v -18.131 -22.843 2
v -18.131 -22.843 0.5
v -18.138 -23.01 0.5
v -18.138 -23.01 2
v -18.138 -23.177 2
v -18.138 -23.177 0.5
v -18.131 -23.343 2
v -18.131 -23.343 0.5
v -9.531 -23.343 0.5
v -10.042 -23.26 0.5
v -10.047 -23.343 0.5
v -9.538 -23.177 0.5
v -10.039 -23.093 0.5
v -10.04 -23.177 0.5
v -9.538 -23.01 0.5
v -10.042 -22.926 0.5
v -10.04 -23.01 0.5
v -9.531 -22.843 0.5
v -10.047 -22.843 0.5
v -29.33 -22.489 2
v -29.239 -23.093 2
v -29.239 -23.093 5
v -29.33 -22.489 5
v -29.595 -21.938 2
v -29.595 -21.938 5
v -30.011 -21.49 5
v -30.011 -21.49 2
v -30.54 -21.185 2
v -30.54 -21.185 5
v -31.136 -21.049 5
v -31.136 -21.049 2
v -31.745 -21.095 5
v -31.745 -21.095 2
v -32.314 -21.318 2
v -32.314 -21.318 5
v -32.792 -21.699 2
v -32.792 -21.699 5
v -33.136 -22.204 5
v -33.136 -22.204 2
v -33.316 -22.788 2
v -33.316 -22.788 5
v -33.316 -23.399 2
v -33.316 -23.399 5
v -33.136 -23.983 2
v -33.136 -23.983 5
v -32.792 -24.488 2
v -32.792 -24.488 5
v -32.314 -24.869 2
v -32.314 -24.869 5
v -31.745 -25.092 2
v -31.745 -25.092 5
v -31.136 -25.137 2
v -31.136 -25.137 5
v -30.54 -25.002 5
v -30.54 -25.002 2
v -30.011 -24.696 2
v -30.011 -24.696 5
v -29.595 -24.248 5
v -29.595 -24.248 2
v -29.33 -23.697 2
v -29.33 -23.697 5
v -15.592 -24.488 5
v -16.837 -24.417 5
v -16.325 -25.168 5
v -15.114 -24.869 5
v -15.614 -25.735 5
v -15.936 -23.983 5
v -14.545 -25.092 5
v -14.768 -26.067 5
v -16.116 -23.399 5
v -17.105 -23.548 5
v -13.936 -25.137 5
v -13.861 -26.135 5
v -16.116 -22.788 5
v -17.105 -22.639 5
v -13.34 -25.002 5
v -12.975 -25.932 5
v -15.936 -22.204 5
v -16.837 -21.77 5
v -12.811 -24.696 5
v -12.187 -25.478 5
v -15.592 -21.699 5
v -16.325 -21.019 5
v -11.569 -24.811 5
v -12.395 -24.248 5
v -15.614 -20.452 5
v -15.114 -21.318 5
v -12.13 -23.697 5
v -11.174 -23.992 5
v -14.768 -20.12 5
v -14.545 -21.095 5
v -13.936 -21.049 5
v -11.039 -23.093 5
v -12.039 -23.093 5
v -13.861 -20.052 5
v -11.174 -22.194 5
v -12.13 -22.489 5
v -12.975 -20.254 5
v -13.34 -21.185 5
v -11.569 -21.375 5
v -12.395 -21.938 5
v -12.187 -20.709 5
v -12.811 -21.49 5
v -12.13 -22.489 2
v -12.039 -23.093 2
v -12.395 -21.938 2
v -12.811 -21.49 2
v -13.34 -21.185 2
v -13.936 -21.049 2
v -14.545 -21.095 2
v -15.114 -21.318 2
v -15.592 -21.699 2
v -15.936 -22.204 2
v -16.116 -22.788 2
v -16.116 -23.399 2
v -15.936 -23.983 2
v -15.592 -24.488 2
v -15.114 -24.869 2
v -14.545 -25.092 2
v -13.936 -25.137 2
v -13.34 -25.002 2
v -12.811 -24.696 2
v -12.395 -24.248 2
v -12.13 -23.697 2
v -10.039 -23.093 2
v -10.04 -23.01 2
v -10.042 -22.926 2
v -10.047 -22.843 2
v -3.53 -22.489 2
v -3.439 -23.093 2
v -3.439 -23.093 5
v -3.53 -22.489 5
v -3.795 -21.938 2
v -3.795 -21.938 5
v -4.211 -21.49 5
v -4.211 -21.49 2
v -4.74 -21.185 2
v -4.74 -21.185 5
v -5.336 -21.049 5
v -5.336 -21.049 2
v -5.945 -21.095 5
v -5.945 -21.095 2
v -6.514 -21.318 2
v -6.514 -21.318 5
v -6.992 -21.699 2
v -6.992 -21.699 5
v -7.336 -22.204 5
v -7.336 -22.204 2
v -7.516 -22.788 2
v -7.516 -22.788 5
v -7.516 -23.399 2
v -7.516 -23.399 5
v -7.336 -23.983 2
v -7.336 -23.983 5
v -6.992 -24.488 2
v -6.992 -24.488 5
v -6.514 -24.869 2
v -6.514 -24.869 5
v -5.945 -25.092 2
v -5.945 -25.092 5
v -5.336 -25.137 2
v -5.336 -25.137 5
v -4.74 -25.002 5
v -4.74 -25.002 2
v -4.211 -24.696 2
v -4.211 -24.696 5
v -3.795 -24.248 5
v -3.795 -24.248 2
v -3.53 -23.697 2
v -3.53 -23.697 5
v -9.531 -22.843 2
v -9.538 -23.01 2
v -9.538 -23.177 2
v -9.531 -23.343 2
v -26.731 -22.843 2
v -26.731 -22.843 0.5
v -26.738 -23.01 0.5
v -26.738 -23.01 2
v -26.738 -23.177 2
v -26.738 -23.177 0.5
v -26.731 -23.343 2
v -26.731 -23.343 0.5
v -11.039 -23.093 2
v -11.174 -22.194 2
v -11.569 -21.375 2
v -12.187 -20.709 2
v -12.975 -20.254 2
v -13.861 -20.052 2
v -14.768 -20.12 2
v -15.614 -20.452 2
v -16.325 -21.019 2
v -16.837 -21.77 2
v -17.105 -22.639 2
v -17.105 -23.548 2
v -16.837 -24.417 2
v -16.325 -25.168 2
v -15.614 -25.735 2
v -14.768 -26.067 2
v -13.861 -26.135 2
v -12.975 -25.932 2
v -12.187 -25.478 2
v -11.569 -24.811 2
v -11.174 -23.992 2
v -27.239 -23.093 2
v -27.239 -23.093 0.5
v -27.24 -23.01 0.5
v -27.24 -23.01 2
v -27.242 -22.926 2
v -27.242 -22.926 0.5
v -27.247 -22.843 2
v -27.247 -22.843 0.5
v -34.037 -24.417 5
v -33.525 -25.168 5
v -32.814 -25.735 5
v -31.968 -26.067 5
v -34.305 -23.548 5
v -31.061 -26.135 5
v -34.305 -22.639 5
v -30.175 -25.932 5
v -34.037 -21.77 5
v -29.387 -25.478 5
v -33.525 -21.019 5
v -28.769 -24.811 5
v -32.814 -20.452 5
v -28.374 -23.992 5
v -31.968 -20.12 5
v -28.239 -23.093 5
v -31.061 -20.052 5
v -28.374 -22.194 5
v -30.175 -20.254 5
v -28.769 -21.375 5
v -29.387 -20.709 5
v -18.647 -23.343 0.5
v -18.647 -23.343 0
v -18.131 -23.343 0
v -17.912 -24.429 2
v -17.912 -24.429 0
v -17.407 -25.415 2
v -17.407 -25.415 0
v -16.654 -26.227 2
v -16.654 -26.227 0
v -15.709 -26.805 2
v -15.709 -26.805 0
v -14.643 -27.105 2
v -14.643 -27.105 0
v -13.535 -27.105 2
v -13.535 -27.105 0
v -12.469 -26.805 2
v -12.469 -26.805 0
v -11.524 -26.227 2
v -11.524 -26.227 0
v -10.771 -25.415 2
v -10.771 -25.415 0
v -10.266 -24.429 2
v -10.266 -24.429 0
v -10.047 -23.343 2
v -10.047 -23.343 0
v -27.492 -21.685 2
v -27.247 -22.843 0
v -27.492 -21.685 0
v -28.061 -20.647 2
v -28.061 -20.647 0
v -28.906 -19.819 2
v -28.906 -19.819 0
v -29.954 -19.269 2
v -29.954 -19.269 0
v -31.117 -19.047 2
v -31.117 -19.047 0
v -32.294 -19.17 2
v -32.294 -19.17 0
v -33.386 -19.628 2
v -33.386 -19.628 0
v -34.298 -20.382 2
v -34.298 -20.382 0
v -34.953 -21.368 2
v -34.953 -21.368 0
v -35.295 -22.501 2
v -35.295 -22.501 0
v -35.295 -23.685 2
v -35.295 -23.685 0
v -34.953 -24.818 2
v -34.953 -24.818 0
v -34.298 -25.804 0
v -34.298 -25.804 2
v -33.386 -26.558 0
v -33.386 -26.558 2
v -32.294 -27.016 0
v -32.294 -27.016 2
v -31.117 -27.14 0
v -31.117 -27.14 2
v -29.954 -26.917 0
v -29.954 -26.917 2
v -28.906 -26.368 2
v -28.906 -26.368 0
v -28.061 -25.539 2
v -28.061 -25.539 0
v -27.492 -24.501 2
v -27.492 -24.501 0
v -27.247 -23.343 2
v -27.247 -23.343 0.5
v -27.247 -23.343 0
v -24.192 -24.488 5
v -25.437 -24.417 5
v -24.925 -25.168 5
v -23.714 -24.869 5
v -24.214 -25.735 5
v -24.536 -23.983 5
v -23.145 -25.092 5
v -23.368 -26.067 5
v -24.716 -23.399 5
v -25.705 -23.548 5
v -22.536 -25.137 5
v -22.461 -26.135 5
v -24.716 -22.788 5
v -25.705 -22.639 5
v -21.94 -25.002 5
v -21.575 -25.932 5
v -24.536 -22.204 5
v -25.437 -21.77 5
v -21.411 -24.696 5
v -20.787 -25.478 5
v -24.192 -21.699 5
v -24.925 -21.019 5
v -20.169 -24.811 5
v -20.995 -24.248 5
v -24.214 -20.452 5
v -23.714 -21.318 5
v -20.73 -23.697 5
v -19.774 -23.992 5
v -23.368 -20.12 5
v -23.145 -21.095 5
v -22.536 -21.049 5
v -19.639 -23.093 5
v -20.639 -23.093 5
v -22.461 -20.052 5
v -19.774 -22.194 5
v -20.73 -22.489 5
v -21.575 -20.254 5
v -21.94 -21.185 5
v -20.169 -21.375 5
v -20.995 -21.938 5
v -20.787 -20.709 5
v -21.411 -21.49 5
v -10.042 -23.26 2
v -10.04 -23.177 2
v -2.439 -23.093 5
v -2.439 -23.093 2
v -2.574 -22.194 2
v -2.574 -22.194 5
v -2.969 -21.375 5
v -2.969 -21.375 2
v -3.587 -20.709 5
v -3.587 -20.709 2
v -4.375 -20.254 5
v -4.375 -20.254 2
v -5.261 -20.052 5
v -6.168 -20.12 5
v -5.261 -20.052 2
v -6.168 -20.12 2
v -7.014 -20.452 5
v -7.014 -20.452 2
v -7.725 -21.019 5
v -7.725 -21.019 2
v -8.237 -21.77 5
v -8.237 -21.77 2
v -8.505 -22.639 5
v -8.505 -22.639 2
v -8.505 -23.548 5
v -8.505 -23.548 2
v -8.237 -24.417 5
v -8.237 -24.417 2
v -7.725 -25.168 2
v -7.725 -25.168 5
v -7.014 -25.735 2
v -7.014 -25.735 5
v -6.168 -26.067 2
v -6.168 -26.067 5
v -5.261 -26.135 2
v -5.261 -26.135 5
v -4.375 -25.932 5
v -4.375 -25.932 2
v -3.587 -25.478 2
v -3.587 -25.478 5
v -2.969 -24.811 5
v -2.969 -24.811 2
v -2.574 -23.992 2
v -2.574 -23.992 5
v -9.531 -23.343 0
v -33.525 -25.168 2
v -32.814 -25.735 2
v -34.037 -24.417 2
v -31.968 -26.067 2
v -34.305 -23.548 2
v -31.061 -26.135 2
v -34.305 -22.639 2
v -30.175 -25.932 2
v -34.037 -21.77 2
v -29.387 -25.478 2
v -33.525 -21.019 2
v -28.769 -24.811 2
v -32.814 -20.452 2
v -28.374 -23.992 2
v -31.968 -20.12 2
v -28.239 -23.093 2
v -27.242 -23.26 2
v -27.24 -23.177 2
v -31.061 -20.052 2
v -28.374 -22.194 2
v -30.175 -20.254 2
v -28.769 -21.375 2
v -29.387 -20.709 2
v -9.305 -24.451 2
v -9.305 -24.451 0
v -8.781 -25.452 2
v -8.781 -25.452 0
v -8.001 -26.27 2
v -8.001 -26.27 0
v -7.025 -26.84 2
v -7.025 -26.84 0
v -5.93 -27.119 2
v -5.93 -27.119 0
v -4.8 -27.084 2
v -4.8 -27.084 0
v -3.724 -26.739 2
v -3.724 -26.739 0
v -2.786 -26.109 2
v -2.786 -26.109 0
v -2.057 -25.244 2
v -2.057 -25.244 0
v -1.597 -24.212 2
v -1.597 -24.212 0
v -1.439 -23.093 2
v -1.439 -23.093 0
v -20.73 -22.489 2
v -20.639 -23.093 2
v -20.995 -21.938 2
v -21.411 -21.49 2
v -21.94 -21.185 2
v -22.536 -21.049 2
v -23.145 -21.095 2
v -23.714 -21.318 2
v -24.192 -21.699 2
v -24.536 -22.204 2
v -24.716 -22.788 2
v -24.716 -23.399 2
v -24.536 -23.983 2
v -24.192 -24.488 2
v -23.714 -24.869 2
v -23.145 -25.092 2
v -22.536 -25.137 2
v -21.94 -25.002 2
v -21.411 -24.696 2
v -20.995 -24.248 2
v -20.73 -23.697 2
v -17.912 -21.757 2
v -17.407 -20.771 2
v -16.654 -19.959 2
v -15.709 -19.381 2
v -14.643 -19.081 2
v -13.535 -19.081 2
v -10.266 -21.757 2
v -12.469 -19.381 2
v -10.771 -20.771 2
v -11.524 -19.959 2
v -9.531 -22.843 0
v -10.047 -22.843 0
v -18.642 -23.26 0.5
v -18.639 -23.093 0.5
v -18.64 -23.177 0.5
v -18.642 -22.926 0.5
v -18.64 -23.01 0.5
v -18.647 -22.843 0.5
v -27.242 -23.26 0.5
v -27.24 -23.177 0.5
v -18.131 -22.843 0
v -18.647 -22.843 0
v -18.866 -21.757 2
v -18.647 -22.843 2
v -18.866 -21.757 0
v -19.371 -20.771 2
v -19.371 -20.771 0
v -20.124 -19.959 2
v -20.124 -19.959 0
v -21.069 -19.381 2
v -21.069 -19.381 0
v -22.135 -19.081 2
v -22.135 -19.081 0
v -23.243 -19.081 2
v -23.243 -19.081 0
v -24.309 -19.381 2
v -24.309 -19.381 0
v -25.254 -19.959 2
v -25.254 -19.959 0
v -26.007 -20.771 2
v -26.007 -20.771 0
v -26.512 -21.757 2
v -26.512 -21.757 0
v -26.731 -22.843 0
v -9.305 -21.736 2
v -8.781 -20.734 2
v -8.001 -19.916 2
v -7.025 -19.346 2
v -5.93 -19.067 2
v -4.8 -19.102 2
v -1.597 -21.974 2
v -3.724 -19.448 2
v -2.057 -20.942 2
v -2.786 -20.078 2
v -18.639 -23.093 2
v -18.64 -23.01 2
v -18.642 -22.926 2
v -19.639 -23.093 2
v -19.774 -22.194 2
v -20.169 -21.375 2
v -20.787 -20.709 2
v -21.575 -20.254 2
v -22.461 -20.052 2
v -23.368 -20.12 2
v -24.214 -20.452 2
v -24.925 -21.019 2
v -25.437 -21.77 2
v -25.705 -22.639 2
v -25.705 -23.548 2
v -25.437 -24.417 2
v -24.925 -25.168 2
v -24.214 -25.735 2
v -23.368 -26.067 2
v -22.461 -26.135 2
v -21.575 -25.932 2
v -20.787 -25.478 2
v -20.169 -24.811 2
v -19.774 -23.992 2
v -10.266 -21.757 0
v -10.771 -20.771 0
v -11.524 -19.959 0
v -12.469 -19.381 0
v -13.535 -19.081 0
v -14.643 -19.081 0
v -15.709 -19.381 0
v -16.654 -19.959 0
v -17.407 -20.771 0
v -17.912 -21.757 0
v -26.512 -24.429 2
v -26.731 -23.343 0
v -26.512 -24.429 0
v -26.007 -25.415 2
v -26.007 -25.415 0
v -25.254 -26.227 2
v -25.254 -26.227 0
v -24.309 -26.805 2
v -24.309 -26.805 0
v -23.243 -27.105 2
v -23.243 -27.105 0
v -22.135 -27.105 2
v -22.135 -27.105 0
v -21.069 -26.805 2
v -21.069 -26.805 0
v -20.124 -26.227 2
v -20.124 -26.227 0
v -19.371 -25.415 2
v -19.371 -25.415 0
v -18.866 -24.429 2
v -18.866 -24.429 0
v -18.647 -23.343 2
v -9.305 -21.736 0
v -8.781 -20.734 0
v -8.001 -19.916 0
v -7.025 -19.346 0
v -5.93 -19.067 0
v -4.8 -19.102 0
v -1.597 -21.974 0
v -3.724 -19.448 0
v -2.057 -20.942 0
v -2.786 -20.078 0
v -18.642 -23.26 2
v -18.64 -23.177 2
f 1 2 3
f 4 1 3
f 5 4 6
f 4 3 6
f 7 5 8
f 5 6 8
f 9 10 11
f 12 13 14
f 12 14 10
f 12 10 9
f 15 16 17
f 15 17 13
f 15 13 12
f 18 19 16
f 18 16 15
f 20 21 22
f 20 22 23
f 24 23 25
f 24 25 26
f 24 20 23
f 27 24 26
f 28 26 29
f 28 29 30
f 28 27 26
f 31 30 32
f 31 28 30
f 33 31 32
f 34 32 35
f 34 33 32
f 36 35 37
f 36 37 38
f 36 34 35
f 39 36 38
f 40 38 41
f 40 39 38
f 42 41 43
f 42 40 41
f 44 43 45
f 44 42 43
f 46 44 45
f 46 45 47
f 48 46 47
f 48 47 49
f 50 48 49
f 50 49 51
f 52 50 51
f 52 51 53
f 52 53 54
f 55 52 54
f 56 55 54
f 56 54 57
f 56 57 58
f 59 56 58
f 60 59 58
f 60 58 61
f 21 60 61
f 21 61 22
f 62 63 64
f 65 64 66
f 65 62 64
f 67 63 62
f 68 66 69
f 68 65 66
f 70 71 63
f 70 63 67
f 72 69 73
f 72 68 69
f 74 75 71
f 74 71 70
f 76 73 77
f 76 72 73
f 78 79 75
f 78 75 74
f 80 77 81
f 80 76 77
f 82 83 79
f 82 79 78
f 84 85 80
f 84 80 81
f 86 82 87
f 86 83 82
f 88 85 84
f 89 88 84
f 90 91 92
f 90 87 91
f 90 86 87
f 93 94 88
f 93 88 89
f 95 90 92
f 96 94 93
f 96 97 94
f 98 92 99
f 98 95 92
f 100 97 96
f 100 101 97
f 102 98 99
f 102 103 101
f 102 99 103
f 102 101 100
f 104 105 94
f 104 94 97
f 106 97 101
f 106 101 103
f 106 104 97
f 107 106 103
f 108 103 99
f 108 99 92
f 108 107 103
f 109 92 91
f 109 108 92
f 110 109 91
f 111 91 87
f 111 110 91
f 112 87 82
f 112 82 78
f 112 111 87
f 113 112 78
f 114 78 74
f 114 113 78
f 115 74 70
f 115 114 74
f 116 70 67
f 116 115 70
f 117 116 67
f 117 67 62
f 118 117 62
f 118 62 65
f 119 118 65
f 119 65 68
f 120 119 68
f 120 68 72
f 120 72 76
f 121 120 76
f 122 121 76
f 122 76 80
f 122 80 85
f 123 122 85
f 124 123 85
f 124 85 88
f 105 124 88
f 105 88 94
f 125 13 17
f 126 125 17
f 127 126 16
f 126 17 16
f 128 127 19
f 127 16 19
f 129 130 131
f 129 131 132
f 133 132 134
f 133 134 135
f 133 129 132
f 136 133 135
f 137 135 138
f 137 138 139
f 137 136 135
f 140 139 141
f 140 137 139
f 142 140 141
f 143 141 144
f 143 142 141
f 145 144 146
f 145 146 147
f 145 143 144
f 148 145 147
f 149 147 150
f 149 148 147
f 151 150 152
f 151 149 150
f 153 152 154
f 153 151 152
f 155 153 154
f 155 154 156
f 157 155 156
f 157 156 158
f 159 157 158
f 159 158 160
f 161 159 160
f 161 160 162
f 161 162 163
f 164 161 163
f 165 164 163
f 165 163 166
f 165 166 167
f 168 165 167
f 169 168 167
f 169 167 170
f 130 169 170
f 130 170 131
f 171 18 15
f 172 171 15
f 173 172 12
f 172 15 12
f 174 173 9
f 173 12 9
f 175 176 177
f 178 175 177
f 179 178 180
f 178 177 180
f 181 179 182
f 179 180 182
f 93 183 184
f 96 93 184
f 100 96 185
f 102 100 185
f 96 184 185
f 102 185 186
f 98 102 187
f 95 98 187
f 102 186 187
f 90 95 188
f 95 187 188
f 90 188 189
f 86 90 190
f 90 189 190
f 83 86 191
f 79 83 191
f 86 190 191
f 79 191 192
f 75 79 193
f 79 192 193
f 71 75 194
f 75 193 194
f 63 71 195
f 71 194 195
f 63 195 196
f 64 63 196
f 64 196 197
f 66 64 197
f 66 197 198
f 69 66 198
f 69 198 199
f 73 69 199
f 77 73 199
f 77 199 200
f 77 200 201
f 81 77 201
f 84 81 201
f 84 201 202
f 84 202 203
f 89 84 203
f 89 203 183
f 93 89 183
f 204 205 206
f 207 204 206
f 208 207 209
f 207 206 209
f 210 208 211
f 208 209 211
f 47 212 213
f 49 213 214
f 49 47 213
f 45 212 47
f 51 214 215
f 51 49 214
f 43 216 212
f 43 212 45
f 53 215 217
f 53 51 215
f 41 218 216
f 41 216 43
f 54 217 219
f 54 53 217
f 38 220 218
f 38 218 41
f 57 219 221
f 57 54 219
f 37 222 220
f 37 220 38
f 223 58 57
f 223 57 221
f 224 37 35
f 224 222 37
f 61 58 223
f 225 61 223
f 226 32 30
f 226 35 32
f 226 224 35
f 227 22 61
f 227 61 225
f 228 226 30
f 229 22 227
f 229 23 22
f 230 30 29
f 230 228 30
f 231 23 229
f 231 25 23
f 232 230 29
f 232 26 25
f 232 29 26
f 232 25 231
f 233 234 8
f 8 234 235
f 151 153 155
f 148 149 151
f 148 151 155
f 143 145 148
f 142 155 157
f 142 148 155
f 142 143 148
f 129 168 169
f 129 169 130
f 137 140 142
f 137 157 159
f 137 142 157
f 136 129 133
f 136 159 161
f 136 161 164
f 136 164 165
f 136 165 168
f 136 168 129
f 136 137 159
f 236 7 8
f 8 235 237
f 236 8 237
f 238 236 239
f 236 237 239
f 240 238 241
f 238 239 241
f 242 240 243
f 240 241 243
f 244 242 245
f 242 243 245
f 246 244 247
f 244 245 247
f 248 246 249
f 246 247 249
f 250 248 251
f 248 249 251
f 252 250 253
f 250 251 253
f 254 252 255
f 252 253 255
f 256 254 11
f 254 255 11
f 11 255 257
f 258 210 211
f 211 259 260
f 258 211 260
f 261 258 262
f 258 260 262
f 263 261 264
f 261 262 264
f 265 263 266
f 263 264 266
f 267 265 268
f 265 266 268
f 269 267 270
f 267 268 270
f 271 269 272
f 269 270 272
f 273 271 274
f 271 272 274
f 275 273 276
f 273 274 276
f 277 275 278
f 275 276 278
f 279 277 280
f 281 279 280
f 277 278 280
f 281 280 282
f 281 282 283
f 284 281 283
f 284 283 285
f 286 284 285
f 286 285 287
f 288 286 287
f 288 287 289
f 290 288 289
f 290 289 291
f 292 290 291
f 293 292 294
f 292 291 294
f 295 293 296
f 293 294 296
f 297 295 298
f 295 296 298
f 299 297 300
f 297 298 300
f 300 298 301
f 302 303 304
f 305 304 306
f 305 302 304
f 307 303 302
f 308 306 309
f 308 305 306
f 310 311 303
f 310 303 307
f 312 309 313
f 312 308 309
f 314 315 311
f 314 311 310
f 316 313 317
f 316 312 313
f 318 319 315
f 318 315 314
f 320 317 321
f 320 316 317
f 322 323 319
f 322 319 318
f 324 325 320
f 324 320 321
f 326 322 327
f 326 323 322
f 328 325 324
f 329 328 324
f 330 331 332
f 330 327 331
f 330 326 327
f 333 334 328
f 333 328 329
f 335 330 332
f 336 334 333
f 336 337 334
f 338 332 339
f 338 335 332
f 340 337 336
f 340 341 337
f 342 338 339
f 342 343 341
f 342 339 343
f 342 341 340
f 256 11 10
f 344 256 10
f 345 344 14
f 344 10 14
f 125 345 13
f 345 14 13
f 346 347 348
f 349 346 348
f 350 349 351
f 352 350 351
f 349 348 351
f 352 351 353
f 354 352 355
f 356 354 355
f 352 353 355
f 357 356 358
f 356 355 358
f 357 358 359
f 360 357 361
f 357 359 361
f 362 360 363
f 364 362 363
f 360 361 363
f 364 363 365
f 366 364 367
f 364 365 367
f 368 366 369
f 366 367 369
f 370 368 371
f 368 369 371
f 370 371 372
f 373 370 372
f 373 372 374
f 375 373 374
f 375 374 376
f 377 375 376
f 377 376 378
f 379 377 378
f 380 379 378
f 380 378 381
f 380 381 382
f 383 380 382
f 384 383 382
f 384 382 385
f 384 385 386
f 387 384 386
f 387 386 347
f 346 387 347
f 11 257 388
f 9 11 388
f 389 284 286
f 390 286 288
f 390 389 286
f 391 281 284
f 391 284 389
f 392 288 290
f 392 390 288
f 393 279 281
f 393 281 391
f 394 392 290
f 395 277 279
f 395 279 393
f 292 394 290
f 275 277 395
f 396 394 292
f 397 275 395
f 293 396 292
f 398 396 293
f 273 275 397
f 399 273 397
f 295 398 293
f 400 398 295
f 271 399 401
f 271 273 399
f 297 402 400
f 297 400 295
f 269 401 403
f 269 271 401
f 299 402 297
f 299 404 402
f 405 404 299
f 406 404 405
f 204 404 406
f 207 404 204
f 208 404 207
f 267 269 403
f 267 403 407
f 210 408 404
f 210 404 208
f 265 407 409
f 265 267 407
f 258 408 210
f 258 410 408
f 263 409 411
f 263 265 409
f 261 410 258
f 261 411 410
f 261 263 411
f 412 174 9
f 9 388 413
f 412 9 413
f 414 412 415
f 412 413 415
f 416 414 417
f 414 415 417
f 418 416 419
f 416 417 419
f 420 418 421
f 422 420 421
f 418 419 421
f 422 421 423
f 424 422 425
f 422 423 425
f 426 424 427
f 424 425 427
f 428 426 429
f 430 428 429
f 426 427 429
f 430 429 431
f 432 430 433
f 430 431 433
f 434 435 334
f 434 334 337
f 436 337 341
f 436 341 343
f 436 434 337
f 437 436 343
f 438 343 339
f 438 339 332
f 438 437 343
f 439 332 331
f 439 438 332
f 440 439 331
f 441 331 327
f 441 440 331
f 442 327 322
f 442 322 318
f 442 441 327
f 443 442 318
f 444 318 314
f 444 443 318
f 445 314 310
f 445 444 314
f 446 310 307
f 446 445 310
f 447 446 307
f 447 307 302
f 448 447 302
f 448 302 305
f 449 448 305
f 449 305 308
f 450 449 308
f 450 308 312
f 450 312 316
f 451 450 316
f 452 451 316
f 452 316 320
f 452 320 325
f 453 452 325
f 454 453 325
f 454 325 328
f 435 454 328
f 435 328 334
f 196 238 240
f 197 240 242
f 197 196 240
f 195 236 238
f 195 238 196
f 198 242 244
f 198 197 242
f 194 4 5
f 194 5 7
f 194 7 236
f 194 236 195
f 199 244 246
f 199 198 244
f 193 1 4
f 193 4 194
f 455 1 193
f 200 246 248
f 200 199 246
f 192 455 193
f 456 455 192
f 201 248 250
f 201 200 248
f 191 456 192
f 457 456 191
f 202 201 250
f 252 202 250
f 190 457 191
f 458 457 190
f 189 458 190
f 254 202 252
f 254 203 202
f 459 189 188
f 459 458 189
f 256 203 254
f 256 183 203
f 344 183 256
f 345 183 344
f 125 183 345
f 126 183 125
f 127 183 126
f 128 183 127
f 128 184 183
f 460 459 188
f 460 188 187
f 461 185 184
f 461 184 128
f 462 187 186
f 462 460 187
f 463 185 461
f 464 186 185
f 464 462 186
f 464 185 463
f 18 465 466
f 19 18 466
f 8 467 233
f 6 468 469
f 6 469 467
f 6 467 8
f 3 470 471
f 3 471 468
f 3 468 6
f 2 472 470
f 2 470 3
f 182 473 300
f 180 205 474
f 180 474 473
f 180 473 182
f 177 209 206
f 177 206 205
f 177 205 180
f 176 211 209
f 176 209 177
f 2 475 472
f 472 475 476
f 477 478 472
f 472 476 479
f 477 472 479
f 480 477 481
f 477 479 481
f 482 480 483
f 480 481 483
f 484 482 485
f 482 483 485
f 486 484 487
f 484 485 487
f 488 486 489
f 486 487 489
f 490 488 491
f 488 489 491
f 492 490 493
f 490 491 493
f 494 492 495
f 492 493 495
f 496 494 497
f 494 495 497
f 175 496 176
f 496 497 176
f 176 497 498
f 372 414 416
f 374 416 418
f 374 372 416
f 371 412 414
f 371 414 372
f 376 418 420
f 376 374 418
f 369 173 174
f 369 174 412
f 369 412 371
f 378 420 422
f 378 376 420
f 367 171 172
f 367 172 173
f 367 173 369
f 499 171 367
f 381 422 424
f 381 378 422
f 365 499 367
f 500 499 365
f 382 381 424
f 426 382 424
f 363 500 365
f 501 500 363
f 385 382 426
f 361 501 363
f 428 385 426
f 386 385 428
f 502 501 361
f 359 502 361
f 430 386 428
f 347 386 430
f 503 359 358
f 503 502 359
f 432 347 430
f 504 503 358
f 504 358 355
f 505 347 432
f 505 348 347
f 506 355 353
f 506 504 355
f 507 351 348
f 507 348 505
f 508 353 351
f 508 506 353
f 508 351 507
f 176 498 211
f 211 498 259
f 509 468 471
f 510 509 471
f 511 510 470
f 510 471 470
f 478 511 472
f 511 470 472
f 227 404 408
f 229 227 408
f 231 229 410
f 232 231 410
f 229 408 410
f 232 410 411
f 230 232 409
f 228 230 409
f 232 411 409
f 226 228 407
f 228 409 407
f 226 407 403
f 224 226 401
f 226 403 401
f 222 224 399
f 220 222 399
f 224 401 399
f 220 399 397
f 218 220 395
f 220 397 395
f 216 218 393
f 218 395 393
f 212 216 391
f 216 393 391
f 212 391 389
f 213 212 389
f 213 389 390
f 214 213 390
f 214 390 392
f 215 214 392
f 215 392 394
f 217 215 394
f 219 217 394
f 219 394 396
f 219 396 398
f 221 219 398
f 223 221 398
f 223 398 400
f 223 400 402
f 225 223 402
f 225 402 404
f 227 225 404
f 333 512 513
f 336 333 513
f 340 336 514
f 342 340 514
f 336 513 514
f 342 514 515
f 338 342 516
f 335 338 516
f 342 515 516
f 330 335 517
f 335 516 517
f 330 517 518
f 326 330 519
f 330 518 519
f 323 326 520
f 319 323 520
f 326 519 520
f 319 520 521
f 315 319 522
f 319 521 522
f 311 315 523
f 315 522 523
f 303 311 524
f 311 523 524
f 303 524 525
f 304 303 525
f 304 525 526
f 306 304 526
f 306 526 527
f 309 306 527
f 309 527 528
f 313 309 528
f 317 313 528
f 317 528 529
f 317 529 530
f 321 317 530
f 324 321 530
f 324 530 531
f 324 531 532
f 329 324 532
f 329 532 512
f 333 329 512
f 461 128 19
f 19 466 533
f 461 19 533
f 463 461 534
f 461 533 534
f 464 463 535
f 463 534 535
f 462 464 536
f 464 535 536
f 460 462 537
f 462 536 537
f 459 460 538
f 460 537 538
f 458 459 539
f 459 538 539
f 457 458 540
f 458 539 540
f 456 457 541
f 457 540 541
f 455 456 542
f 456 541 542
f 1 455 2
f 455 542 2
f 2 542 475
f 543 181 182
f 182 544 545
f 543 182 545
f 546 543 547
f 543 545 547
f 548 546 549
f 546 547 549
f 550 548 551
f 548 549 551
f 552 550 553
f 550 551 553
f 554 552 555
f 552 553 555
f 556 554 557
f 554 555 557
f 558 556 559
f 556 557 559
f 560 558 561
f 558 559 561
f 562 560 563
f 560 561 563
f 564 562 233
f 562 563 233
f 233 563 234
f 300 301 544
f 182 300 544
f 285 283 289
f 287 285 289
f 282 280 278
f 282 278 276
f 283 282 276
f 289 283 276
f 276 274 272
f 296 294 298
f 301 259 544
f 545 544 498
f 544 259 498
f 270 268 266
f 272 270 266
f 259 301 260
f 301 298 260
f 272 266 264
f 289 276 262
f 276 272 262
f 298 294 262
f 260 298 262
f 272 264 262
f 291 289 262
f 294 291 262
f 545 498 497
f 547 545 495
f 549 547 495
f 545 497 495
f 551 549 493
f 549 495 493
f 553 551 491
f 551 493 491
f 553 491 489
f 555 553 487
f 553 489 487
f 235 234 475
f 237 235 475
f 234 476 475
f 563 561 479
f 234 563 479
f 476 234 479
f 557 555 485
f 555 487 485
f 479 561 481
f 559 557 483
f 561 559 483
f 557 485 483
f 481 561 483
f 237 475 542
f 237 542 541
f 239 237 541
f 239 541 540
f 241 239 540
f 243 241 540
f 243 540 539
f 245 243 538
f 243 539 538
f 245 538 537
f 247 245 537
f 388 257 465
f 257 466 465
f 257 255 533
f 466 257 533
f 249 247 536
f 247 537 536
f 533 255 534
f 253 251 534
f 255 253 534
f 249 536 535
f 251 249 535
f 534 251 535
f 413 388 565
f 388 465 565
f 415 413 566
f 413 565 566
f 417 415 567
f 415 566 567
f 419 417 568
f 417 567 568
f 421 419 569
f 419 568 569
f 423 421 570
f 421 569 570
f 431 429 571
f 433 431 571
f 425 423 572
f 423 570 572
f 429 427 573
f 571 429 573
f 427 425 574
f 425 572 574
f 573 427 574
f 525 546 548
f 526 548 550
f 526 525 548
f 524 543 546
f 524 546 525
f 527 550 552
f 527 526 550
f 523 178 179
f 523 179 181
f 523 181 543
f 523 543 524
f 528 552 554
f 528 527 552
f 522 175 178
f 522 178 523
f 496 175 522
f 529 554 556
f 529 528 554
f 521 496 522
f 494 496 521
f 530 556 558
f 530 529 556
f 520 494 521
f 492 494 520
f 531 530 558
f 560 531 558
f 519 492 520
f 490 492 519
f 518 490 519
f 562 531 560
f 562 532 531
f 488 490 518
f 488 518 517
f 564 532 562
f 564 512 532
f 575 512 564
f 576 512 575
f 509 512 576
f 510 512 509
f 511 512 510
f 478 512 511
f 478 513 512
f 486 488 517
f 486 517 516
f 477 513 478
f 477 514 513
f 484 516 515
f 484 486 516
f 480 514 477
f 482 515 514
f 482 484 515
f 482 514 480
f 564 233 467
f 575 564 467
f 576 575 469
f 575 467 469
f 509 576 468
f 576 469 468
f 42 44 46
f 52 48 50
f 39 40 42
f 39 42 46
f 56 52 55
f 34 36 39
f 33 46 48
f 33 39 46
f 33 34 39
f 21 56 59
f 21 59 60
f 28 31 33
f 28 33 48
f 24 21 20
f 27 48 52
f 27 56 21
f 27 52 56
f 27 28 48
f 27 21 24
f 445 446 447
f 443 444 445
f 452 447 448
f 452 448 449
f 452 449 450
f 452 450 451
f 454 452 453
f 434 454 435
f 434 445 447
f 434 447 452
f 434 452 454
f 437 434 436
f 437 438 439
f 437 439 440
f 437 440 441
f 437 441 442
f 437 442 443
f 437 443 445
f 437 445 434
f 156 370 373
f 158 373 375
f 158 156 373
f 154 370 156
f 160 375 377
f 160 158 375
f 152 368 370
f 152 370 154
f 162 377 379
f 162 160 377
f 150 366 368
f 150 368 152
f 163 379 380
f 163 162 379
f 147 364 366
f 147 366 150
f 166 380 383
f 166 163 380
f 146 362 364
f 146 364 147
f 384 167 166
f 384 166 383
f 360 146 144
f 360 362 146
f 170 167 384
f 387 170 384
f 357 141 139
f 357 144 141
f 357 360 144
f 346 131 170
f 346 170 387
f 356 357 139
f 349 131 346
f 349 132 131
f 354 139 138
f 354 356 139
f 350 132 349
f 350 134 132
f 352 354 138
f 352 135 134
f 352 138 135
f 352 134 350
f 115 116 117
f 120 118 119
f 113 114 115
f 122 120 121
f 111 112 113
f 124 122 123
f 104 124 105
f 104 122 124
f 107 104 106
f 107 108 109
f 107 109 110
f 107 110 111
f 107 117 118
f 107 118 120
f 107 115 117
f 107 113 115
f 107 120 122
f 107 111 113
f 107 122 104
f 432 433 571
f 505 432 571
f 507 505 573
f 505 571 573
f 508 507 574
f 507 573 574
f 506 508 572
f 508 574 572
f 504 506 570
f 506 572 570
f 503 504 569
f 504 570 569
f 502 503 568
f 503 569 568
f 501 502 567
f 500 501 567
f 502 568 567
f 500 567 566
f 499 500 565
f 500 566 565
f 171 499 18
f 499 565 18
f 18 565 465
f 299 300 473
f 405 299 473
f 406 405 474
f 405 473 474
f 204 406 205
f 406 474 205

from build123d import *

# Parameters (mm, degrees)
F0_R     = 3.05
F0_R_2   = 2.05
F1_DEPTH = 5
F2_DEPTH = 2
F3_DEPTH = 0.5


with BuildPart() as f1:
    # F0 (on Top) → F1 (new body)
    with BuildSketch(Plane.XY):
        with Locations((-31.2889043277, -23.0932135019)):
            Circle(F0_R)
        with Locations((-31.2889043277, -23.0932135019)):
            Circle(F0_R_2, mode=Mode.SUBTRACT)
    extrude(amount=F1_DEPTH)

    # F0 (on Top) → F2 (join)
    with BuildSketch(Plane.XY):
        with BuildLine():
            ThreePointArc((-27.2466277414, -23.3432135019), (-27.2408356416, -23.2182731388), (-27.2389043277, -23.0932135019))
            ThreePointArc((-27.2389043277, -23.0932135019), (-27.2408356416, -22.9681538651), (-27.2466277414, -22.8432135019))
            ThreePointArc((-27.2466277414, -22.8432135019), (-35.3389043277, -23.0932135019), (-27.2466277414, -23.3432135019))
        make_face()
        with Locations((-31.2889043277, -23.0932135019)):
            Circle(F0_R, mode=Mode.SUBTRACT)
        with Locations((-31.2889043277, -23.0932135019)):
            Circle(F0_R_2)
    extrude(amount=F2_DEPTH)



with BuildPart() as f1b:
    # F0 (on Top) → F1, piece 2 (new body)
    with BuildSketch(Plane.XY):
        with Locations((-22.6889043277, -23.0932135019)):
            Circle(F0_R)
        with Locations((-22.6889043277, -23.0932135019)):
            Circle(F0_R_2, mode=Mode.SUBTRACT)
    extrude(amount=F1_DEPTH)

    # F0 (on Top) → F2, piece 2 (join)
    with BuildSketch(Plane.XY):
        with BuildLine():
            ThreePointArc((-18.6466277414, -22.8432135019), (-22.6889043277, -19.0432135019), (-26.731180914, -22.8432135019))
            ThreePointArc((-26.731180914, -22.8432135019), (-26.7389043277, -23.0932135019), (-26.731180914, -23.3432135019))
            ThreePointArc((-26.731180914, -23.3432135019), (-22.6889043277, -27.1432135019), (-18.6466277414, -23.3432135019))
            ThreePointArc((-18.6466277414, -23.3432135019), (-18.6408356416, -23.2182731388), (-18.6389043277, -23.0932135019))
            ThreePointArc((-18.6389043277, -23.0932135019), (-18.6408356416, -22.9681538651), (-18.6466277414, -22.8432135019))
        make_face()
        with Locations((-22.6889043277, -23.0932135019)):
            Circle(F0_R, mode=Mode.SUBTRACT)
        with Locations((-22.6889043277, -23.0932135019)):
            Circle(F0_R_2)
    extrude(amount=F2_DEPTH)


with BuildPart() as f1c:
    # F0 (on Top) → F1, piece 3 (new body)
    with BuildSketch(Plane.XY):
        with Locations((-14.0889043277, -23.0932135019)):
            Circle(F0_R)
        with Locations((-14.0889043277, -23.0932135019)):
            Circle(F0_R_2, mode=Mode.SUBTRACT)
    extrude(amount=F1_DEPTH)

    # F0 (on Top) → F2, piece 3 (join)
    with BuildSketch(Plane.XY):
        with BuildLine():
            ThreePointArc((-10.0466277414, -22.8432135019), (-14.0889043277, -19.0432135019), (-18.131180914, -22.8432135019))
            ThreePointArc((-18.131180914, -22.8432135019), (-18.1389043277, -23.0932135019), (-18.131180914, -23.3432135019))
            ThreePointArc((-18.131180914, -23.3432135019), (-14.0889043277, -27.1432135019), (-10.0466277414, -23.3432135019))
            ThreePointArc((-10.0466277414, -23.3432135019), (-10.0408356416, -23.2182731388), (-10.0389043277, -23.0932135019))
            ThreePointArc((-10.0389043277, -23.0932135019), (-10.0408356416, -22.9681538651), (-10.0466277414, -22.8432135019))
        make_face()
        with Locations((-14.0889043277, -23.0932135019)):
            Circle(F0_R, mode=Mode.SUBTRACT)
        with Locations((-14.0889043277, -23.0932135019)):
            Circle(F0_R_2)
    extrude(amount=F2_DEPTH)


with BuildPart() as f1d:
    # F0 (on Top) → F1, piece 4 (new body)
    with BuildSketch(Plane.XY):
        with Locations((-5.4889043277, -23.0932135019)):
            Circle(F0_R)
        with Locations((-5.4889043277, -23.0932135019)):
            Circle(F0_R_2, mode=Mode.SUBTRACT)
    extrude(amount=F1_DEPTH)

    # F0 (on Top) → F2, piece 4 (join)
    with BuildSketch(Plane.XY):
        with BuildLine():
            ThreePointArc((-1.4389043277, -23.0932135019), (-5.3638446908, -19.0451448159), (-9.531180914, -22.8432135019))
            ThreePointArc((-9.531180914, -22.8432135019), (-9.5389043277, -23.0932135019), (-9.531180914, -23.3432135019))
            ThreePointArc((-9.531180914, -23.3432135019), (-5.3638446908, -27.141282188), (-1.4389043277, -23.0932135019))
        make_face()
        with Locations((-5.4889043277, -23.0932135019)):
            Circle(F0_R, mode=Mode.SUBTRACT)
        with Locations((-5.4889043277, -23.0932135019)):
            Circle(F0_R_2)
    extrude(amount=F2_DEPTH)


with BuildPart() as f1_1:
    add(f1.part)

    add(f1b.part)  # F3 merges F1b

    add(f1c.part)  # F3 merges F1c

    add(f1d.part)  # F3 merges F1d
    # F0 (on Top) → F3 (join)
    with BuildSketch(Plane.XY):
        with BuildLine():
            ThreePointArc((-27.2466277414, -22.8432135019), (-27.2408356416, -22.9681538651), (-27.2389043277, -23.0932135019))
            ThreePointArc((-27.2389043277, -23.0932135019), (-27.2408356416, -23.2182731388), (-27.2466277414, -23.3432135019))
            Line((-27.2466277414, -23.3432135019), (-26.731180914, -23.3432135019))
            ThreePointArc((-26.731180914, -23.3432135019), (-26.7389043277, -23.0932135019), (-26.731180914, -22.8432135019))
            Line((-26.731180914, -22.8432135019), (-27.2466277414, -22.8432135019))
        make_face()
        with BuildLine():
            Line((-18.131180914, -22.8432135019), (-18.6466277414, -22.8432135019))
            ThreePointArc((-18.6466277414, -22.8432135019), (-18.6408356416, -22.9681538651), (-18.6389043277, -23.0932135019))
            ThreePointArc((-18.6389043277, -23.0932135019), (-18.6408356416, -23.2182731388), (-18.6466277414, -23.3432135019))
            Line((-18.6466277414, -23.3432135019), (-18.131180914, -23.3432135019))
            ThreePointArc((-18.131180914, -23.3432135019), (-18.1389043277, -23.0932135019), (-18.131180914, -22.8432135019))
        make_face()
        with BuildLine():
            Line((-9.531180914, -22.8432135019), (-10.0466277414, -22.8432135019))
            ThreePointArc((-10.0466277414, -22.8432135019), (-10.0408356416, -22.9681538651), (-10.0389043277, -23.0932135019))
            ThreePointArc((-10.0389043277, -23.0932135019), (-10.0408356416, -23.2182731388), (-10.0466277414, -23.3432135019))
            Line((-10.0466277414, -23.3432135019), (-9.531180914, -23.3432135019))
            ThreePointArc((-9.531180914, -23.3432135019), (-9.5389043277, -23.0932135019), (-9.531180914, -22.8432135019))
        make_face()
    extrude(amount=F3_DEPTH)


solid = f1_1.part
